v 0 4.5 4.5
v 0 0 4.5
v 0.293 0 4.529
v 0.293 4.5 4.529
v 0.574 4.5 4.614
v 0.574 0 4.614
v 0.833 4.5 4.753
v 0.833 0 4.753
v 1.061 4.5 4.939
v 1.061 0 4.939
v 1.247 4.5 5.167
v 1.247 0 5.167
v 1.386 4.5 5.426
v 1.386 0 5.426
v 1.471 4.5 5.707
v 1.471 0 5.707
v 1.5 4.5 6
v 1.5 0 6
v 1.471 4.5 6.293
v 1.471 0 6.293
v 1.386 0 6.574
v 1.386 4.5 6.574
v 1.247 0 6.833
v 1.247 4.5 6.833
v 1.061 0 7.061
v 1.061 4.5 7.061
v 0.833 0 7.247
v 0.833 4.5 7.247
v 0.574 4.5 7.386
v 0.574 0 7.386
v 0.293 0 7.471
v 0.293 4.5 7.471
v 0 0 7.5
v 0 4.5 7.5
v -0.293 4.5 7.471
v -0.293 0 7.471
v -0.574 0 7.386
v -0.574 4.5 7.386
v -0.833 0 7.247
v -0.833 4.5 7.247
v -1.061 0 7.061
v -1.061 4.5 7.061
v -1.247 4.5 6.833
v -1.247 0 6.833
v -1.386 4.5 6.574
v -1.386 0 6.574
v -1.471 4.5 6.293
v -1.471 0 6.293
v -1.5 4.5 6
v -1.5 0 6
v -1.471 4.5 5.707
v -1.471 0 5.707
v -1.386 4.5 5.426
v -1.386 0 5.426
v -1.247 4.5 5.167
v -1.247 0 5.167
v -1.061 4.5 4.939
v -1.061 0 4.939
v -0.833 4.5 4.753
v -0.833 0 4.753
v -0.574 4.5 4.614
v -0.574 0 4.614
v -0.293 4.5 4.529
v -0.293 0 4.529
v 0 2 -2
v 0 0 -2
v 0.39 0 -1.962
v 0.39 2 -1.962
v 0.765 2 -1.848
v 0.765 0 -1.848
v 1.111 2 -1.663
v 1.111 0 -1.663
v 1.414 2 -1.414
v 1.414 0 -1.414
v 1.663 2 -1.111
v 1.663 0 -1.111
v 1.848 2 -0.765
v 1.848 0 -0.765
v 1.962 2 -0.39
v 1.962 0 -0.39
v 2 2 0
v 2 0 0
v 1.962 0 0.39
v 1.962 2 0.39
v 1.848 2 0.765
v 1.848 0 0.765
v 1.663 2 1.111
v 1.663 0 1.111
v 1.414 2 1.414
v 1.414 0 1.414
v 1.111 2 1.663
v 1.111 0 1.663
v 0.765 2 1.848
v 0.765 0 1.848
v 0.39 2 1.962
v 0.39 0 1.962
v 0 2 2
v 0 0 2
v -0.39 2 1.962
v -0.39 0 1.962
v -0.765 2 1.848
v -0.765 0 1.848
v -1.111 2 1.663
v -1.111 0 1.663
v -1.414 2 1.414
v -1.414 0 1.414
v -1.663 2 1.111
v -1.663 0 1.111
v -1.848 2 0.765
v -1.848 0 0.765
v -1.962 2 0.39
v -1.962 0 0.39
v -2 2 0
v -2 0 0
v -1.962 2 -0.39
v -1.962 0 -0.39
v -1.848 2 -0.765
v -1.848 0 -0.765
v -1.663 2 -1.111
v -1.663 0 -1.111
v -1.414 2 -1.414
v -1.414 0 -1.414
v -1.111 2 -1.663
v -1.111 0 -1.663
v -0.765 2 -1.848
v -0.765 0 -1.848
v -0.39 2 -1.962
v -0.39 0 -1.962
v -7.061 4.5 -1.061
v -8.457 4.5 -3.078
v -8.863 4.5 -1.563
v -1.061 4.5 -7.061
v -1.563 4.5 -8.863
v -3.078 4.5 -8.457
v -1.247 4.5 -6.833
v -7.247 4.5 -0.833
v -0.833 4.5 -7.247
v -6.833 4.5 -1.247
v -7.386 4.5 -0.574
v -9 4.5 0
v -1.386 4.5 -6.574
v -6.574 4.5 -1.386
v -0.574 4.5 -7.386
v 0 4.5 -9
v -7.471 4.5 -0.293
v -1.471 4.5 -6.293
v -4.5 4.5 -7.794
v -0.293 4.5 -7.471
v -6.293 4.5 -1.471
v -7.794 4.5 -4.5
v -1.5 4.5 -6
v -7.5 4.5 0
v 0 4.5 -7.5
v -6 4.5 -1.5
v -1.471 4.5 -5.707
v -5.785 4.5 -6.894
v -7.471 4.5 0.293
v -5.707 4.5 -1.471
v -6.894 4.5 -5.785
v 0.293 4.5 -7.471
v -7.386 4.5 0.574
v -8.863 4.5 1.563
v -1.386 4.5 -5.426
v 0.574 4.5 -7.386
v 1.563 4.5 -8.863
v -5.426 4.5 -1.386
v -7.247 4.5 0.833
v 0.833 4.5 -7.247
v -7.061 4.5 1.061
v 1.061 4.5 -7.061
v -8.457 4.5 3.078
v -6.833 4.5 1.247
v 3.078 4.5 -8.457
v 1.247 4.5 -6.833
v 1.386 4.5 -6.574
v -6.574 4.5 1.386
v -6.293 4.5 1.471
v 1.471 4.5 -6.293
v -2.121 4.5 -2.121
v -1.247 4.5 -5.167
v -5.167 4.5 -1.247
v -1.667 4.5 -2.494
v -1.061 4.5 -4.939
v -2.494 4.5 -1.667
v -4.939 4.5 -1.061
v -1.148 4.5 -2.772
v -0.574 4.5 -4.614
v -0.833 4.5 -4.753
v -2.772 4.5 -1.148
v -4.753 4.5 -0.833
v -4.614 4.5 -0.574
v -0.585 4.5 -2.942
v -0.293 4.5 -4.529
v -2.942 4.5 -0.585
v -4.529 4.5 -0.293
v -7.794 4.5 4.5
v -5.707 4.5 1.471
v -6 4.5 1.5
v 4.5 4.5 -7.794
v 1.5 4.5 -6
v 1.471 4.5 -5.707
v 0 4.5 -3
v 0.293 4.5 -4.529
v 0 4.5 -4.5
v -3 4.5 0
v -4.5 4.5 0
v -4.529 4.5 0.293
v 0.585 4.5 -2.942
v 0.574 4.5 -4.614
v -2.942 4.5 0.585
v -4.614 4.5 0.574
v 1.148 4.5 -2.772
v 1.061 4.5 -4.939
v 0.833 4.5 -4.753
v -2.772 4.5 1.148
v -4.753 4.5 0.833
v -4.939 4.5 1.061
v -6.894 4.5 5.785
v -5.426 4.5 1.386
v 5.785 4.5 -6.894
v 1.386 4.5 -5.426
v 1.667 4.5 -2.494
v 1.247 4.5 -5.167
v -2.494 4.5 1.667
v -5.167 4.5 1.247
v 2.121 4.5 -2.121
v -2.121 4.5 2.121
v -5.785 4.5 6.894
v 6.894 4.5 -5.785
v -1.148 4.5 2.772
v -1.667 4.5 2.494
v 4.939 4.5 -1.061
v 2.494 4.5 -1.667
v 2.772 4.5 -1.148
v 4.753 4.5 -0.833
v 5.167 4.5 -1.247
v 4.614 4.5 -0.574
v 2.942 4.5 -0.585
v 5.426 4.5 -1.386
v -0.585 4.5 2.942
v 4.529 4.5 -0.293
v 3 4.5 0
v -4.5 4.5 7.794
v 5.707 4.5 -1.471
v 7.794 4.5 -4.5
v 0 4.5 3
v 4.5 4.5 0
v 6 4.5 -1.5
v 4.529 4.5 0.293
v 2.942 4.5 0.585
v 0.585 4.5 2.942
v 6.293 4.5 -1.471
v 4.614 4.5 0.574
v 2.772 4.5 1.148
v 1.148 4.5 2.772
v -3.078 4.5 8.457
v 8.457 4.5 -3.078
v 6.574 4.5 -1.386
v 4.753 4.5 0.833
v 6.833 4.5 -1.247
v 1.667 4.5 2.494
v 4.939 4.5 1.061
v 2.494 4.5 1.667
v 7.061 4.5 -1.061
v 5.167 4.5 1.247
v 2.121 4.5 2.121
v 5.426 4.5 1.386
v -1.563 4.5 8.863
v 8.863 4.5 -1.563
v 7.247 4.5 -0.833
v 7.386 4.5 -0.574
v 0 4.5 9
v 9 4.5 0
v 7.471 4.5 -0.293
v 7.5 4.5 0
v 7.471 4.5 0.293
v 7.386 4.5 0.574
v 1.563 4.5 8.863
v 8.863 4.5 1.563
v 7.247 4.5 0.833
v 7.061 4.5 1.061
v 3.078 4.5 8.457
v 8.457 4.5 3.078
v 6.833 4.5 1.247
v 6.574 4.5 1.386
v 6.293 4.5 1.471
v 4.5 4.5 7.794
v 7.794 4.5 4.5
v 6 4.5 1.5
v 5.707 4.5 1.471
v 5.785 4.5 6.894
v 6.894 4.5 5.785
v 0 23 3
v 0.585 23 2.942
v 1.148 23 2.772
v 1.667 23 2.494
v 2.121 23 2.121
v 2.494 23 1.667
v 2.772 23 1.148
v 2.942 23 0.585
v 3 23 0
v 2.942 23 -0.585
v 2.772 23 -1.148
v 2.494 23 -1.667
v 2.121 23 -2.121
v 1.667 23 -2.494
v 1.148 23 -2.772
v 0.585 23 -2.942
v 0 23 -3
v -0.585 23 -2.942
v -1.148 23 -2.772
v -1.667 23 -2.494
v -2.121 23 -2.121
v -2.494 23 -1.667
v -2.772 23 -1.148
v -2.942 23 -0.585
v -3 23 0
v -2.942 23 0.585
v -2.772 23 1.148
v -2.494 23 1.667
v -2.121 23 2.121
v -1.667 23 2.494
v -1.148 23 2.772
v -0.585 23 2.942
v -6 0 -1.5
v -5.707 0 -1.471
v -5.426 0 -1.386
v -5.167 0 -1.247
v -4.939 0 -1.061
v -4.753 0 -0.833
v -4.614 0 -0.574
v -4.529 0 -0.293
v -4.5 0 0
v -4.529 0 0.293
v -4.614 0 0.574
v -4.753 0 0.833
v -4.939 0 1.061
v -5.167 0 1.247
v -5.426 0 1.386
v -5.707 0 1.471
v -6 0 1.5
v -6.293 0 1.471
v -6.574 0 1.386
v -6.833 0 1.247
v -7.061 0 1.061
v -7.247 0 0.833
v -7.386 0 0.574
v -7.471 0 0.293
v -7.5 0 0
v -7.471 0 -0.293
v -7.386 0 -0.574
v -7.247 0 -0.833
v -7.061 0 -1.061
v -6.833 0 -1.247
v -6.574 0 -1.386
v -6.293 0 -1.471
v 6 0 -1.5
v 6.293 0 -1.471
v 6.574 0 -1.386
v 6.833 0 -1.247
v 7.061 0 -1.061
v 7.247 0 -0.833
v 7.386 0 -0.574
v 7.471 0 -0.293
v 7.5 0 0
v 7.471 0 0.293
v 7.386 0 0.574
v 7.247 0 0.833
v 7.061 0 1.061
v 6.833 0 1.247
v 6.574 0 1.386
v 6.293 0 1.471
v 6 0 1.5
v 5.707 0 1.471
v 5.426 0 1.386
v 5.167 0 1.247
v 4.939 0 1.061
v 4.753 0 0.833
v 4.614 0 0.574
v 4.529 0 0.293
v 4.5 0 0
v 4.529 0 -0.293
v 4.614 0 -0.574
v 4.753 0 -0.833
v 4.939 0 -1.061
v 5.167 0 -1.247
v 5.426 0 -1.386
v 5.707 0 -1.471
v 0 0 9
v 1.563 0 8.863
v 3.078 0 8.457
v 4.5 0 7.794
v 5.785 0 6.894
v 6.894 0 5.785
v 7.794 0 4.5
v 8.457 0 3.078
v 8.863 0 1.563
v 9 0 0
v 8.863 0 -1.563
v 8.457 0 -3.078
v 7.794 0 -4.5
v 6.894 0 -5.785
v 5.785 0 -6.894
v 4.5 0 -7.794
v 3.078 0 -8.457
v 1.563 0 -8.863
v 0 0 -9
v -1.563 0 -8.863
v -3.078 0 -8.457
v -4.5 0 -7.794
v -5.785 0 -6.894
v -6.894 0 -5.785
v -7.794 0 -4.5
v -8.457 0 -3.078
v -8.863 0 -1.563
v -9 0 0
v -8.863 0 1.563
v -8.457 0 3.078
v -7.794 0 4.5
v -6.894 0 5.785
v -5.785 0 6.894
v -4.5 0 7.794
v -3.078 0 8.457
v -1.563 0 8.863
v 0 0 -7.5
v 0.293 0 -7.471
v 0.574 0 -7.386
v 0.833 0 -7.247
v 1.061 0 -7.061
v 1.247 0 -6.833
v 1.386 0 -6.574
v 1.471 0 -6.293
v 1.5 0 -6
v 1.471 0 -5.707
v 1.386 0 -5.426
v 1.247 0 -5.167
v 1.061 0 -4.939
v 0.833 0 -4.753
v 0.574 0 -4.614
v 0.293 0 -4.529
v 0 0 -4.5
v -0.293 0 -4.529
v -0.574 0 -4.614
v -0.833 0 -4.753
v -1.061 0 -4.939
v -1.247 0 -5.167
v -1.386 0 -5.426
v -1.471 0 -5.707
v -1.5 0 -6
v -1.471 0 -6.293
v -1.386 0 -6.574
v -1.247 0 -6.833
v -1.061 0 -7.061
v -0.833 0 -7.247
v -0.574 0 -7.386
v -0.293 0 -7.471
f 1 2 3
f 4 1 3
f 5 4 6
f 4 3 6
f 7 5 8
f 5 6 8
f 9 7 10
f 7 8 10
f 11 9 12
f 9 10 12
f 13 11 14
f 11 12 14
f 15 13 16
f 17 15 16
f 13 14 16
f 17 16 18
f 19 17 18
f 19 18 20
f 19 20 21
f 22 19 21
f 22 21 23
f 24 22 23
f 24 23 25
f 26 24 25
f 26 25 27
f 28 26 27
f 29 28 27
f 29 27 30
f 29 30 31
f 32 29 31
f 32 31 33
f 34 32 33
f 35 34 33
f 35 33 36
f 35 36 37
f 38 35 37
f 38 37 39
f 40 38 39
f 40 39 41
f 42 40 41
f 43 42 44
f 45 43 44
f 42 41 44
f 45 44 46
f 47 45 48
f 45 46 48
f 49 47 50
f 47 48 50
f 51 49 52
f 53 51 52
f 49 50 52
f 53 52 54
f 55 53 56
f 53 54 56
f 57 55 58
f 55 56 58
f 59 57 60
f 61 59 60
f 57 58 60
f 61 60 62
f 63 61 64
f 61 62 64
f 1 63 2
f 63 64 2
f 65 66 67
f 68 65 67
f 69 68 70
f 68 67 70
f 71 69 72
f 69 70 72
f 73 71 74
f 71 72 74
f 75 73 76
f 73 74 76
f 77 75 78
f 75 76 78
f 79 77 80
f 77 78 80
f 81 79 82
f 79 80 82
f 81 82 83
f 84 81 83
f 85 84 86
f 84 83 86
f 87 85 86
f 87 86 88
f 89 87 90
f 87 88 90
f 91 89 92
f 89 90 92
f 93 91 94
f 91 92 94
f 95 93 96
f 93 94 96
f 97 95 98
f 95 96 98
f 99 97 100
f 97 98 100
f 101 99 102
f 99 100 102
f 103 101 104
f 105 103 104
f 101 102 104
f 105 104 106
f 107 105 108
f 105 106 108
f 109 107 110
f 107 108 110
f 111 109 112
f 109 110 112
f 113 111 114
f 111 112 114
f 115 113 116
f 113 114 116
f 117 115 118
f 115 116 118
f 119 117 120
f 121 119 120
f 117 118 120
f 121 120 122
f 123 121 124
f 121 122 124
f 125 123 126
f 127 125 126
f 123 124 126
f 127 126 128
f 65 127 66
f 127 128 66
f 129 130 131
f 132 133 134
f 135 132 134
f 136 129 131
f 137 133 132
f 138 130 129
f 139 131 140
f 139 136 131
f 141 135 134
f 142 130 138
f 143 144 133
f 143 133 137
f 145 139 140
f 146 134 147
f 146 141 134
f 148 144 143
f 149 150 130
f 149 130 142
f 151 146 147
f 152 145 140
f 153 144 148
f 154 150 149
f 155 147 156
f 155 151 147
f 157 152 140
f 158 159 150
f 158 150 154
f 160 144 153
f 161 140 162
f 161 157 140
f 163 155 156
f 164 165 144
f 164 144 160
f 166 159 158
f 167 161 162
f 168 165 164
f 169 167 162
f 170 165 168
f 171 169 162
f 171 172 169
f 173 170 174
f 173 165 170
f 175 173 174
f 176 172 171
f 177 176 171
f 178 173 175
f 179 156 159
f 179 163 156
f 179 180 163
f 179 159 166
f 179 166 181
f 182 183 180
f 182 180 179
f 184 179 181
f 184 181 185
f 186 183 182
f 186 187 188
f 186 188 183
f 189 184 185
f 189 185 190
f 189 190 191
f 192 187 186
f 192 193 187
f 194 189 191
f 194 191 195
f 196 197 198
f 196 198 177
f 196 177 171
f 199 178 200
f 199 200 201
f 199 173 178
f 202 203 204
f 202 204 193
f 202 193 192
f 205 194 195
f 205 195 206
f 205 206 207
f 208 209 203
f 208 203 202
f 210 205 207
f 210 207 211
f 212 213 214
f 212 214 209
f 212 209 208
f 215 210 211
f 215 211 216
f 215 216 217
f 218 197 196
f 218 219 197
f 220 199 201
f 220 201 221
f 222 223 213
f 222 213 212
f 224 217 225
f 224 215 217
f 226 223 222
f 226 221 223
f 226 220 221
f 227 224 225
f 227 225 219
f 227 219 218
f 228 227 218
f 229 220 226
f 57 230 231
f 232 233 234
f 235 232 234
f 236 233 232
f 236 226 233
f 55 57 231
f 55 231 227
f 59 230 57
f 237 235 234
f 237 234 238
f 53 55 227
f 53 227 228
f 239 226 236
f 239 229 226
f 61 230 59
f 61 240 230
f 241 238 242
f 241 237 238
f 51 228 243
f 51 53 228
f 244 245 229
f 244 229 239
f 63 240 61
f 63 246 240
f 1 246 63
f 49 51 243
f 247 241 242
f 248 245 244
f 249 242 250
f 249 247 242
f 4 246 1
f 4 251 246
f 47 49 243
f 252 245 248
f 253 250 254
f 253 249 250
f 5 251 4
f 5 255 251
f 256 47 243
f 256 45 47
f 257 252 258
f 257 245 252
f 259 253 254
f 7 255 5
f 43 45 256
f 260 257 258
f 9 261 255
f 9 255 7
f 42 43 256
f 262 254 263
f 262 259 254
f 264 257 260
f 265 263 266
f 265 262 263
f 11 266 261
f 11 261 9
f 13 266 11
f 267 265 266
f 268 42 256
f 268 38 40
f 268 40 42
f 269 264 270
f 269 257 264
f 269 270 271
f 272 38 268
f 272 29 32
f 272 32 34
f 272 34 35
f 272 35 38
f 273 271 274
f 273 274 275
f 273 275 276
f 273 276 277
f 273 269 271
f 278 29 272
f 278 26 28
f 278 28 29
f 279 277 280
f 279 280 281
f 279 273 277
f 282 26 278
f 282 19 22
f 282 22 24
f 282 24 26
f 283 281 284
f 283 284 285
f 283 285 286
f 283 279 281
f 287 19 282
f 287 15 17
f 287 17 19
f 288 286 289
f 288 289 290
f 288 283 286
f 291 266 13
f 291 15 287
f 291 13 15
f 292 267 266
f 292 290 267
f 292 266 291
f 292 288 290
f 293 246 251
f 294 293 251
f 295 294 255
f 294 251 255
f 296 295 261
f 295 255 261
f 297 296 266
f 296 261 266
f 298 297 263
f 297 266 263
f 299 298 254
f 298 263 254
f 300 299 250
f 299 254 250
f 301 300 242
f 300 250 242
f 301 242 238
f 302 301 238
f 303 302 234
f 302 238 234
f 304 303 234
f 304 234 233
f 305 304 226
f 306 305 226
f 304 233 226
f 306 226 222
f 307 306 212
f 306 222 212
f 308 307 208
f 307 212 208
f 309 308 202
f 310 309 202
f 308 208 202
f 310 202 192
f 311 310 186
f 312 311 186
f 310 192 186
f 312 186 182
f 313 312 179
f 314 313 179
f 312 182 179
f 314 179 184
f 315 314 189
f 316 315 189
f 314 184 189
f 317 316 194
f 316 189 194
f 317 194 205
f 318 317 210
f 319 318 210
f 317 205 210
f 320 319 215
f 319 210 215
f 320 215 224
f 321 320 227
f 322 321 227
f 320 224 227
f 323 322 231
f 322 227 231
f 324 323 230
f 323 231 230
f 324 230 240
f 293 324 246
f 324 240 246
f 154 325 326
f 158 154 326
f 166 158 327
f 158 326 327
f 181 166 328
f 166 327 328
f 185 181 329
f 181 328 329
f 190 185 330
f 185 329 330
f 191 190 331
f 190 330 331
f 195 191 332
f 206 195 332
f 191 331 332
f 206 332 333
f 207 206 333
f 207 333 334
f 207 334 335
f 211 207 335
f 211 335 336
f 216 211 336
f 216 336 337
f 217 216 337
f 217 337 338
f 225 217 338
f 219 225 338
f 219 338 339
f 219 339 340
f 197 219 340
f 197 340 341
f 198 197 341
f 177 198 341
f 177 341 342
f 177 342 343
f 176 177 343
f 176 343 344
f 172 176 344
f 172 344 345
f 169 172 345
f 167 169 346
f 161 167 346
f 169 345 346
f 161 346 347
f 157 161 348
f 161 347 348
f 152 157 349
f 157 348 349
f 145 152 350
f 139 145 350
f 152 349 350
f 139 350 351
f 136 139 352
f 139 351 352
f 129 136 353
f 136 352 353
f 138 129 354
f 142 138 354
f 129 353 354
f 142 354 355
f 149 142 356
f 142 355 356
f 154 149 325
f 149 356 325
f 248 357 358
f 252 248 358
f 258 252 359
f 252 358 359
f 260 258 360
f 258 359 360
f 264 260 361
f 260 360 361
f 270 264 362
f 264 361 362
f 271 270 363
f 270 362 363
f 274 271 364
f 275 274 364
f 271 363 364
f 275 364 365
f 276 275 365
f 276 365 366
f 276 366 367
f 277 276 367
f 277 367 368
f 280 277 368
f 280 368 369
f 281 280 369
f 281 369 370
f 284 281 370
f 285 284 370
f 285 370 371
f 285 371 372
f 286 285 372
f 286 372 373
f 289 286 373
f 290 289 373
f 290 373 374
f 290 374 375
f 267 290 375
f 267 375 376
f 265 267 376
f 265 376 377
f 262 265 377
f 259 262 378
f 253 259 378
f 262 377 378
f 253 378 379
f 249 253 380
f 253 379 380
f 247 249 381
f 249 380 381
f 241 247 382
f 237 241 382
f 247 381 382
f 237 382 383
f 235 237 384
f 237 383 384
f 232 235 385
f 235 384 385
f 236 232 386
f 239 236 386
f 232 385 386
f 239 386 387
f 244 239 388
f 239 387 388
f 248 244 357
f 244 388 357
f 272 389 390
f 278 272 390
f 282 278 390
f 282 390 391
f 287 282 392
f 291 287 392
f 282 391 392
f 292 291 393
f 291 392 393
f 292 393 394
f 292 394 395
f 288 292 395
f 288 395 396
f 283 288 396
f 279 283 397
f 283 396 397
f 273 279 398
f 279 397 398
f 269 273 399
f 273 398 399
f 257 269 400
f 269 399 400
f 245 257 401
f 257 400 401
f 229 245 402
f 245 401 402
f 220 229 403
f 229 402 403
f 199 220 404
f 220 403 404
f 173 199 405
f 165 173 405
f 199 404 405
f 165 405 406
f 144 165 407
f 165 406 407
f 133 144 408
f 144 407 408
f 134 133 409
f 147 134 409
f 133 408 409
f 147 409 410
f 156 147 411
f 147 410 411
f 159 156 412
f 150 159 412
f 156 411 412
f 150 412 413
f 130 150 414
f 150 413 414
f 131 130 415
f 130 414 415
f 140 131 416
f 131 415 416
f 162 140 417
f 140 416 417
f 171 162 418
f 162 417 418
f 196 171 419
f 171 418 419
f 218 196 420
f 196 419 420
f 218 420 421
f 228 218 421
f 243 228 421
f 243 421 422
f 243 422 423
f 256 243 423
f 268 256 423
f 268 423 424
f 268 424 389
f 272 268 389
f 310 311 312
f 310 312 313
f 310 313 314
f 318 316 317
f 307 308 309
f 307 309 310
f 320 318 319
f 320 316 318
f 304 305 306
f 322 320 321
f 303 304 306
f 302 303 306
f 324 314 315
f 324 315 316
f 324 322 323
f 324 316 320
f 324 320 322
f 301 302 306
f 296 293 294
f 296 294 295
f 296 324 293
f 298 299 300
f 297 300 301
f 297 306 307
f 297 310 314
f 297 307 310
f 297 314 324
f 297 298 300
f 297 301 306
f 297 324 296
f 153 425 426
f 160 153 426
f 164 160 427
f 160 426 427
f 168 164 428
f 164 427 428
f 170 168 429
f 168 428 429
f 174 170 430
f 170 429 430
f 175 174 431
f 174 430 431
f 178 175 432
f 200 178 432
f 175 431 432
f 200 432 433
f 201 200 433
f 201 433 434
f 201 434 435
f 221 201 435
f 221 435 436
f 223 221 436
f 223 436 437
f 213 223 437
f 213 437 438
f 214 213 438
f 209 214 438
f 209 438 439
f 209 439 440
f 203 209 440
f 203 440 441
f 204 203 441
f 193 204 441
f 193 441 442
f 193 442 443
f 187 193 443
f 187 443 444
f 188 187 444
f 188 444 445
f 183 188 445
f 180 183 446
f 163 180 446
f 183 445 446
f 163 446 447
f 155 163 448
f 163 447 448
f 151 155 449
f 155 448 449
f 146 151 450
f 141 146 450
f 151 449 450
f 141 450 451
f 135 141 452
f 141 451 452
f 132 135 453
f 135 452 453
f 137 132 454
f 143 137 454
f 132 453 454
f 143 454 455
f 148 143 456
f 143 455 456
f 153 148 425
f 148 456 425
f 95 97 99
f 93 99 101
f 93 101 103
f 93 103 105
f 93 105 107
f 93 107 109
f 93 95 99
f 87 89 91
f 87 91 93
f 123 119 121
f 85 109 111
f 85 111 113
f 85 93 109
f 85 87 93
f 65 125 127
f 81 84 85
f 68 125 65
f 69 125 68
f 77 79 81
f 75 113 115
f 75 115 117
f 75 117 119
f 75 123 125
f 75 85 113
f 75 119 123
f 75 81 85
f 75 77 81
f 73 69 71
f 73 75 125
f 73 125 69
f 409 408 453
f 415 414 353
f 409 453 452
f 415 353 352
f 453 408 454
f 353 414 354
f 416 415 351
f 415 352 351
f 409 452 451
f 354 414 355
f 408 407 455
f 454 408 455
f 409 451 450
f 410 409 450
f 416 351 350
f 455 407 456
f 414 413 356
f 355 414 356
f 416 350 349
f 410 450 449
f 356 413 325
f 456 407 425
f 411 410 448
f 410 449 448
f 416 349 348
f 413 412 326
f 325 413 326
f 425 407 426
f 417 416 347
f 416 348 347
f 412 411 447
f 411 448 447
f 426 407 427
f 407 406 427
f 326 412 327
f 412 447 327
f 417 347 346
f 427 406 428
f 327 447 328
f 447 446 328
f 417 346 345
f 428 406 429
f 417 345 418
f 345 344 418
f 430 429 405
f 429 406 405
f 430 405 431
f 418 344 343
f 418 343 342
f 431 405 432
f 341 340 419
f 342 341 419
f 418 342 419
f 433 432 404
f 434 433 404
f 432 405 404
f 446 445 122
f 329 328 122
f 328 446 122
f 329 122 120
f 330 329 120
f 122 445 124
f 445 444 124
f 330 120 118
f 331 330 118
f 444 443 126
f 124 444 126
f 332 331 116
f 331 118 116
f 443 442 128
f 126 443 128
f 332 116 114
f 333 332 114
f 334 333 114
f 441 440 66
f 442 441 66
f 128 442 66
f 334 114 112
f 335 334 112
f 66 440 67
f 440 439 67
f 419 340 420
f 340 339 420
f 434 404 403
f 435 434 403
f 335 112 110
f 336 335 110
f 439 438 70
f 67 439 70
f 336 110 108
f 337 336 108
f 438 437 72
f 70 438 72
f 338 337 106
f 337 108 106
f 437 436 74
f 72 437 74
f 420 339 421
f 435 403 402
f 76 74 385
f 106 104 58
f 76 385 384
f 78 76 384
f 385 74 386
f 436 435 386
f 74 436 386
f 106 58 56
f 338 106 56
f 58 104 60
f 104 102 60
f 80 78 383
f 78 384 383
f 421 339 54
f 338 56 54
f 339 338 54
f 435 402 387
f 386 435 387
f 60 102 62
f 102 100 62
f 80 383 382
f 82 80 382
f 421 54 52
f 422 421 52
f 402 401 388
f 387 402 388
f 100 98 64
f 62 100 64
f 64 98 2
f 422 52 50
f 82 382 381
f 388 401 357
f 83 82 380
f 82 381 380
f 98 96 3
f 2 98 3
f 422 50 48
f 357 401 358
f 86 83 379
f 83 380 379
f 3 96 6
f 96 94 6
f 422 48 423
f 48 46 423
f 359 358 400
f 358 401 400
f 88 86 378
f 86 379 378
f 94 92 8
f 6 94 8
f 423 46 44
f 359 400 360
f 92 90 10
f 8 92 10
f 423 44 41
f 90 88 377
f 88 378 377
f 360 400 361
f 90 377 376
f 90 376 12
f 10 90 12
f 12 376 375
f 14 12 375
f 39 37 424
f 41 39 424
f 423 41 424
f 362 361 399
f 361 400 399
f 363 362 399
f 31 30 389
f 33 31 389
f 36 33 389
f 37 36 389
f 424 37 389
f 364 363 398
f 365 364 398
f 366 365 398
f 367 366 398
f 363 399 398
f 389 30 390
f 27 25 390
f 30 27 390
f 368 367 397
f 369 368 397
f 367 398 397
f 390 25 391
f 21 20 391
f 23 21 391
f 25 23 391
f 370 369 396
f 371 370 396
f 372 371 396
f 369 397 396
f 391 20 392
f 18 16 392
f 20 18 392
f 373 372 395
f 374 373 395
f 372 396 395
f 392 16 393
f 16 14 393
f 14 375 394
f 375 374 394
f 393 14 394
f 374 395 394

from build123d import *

# Parameters (mm, degrees)
SKETCH_1_R          = 9
EXTRUDE_1_DEPTH     = 4.5
SKETCH_2_R          = 2
CUT_EXTRUDE_1_DEPTH = 2
SKETCH_3_R          = 1.5
CUT_EXTRUDE_2_DEPTH = 14.5
SKETCH_4_R          = 3
EXTRUDE_2_DEPTH     = 18.5


with BuildPart() as part:
    # 草图1 → 凸台-拉伸1 (new body)
    with BuildSketch(Plane(origin=(0, 0, 0), x_dir=(1, 0, 0), z_dir=(0, 1, 0))):
        with Locations(Location((0, 0, 0), (0, 0, 270))):
            Circle(SKETCH_1_R)
    extrude(amount=EXTRUDE_1_DEPTH)

    # 草图2 → 切除-拉伸1 (cut)
    with BuildSketch(Plane.XZ):
        with Locations(Location((0, 0, 0), (0, 0, 270))):
            Circle(SKETCH_2_R)
    extrude(amount=-CUT_EXTRUDE_1_DEPTH, mode=Mode.SUBTRACT)

    # 草图3 → 切除-拉伸2 (cut, through all)
    with BuildSketch(Plane.XZ):
        with Locations(Location((0, 6, 0), (0, 0, 270))):
            Circle(SKETCH_3_R)
        with Locations(Location((6, 0, 0), (0, 0, 270))):
            Circle(SKETCH_3_R)
        with Locations(Location((0, -6, 0), (0, 0, 270))):
            Circle(SKETCH_3_R)
        with Locations(Location((-6, 0, 0), (0, 0, 270))):
            Circle(SKETCH_3_R)
    extrude(amount=-CUT_EXTRUDE_2_DEPTH, mode=Mode.SUBTRACT)

    # 草图4 → 凸台-拉伸2 (add)
    with BuildSketch(Plane(origin=(0, 4.5, 0), x_dir=(1, 0, 0), z_dir=(0, 1, 0))):
        with Locations(Location((0, 0, 0), (0, 0, 270))):
            Circle(SKETCH_4_R)
    extrude(amount=EXTRUDE_2_DEPTH)


solid = part.part
